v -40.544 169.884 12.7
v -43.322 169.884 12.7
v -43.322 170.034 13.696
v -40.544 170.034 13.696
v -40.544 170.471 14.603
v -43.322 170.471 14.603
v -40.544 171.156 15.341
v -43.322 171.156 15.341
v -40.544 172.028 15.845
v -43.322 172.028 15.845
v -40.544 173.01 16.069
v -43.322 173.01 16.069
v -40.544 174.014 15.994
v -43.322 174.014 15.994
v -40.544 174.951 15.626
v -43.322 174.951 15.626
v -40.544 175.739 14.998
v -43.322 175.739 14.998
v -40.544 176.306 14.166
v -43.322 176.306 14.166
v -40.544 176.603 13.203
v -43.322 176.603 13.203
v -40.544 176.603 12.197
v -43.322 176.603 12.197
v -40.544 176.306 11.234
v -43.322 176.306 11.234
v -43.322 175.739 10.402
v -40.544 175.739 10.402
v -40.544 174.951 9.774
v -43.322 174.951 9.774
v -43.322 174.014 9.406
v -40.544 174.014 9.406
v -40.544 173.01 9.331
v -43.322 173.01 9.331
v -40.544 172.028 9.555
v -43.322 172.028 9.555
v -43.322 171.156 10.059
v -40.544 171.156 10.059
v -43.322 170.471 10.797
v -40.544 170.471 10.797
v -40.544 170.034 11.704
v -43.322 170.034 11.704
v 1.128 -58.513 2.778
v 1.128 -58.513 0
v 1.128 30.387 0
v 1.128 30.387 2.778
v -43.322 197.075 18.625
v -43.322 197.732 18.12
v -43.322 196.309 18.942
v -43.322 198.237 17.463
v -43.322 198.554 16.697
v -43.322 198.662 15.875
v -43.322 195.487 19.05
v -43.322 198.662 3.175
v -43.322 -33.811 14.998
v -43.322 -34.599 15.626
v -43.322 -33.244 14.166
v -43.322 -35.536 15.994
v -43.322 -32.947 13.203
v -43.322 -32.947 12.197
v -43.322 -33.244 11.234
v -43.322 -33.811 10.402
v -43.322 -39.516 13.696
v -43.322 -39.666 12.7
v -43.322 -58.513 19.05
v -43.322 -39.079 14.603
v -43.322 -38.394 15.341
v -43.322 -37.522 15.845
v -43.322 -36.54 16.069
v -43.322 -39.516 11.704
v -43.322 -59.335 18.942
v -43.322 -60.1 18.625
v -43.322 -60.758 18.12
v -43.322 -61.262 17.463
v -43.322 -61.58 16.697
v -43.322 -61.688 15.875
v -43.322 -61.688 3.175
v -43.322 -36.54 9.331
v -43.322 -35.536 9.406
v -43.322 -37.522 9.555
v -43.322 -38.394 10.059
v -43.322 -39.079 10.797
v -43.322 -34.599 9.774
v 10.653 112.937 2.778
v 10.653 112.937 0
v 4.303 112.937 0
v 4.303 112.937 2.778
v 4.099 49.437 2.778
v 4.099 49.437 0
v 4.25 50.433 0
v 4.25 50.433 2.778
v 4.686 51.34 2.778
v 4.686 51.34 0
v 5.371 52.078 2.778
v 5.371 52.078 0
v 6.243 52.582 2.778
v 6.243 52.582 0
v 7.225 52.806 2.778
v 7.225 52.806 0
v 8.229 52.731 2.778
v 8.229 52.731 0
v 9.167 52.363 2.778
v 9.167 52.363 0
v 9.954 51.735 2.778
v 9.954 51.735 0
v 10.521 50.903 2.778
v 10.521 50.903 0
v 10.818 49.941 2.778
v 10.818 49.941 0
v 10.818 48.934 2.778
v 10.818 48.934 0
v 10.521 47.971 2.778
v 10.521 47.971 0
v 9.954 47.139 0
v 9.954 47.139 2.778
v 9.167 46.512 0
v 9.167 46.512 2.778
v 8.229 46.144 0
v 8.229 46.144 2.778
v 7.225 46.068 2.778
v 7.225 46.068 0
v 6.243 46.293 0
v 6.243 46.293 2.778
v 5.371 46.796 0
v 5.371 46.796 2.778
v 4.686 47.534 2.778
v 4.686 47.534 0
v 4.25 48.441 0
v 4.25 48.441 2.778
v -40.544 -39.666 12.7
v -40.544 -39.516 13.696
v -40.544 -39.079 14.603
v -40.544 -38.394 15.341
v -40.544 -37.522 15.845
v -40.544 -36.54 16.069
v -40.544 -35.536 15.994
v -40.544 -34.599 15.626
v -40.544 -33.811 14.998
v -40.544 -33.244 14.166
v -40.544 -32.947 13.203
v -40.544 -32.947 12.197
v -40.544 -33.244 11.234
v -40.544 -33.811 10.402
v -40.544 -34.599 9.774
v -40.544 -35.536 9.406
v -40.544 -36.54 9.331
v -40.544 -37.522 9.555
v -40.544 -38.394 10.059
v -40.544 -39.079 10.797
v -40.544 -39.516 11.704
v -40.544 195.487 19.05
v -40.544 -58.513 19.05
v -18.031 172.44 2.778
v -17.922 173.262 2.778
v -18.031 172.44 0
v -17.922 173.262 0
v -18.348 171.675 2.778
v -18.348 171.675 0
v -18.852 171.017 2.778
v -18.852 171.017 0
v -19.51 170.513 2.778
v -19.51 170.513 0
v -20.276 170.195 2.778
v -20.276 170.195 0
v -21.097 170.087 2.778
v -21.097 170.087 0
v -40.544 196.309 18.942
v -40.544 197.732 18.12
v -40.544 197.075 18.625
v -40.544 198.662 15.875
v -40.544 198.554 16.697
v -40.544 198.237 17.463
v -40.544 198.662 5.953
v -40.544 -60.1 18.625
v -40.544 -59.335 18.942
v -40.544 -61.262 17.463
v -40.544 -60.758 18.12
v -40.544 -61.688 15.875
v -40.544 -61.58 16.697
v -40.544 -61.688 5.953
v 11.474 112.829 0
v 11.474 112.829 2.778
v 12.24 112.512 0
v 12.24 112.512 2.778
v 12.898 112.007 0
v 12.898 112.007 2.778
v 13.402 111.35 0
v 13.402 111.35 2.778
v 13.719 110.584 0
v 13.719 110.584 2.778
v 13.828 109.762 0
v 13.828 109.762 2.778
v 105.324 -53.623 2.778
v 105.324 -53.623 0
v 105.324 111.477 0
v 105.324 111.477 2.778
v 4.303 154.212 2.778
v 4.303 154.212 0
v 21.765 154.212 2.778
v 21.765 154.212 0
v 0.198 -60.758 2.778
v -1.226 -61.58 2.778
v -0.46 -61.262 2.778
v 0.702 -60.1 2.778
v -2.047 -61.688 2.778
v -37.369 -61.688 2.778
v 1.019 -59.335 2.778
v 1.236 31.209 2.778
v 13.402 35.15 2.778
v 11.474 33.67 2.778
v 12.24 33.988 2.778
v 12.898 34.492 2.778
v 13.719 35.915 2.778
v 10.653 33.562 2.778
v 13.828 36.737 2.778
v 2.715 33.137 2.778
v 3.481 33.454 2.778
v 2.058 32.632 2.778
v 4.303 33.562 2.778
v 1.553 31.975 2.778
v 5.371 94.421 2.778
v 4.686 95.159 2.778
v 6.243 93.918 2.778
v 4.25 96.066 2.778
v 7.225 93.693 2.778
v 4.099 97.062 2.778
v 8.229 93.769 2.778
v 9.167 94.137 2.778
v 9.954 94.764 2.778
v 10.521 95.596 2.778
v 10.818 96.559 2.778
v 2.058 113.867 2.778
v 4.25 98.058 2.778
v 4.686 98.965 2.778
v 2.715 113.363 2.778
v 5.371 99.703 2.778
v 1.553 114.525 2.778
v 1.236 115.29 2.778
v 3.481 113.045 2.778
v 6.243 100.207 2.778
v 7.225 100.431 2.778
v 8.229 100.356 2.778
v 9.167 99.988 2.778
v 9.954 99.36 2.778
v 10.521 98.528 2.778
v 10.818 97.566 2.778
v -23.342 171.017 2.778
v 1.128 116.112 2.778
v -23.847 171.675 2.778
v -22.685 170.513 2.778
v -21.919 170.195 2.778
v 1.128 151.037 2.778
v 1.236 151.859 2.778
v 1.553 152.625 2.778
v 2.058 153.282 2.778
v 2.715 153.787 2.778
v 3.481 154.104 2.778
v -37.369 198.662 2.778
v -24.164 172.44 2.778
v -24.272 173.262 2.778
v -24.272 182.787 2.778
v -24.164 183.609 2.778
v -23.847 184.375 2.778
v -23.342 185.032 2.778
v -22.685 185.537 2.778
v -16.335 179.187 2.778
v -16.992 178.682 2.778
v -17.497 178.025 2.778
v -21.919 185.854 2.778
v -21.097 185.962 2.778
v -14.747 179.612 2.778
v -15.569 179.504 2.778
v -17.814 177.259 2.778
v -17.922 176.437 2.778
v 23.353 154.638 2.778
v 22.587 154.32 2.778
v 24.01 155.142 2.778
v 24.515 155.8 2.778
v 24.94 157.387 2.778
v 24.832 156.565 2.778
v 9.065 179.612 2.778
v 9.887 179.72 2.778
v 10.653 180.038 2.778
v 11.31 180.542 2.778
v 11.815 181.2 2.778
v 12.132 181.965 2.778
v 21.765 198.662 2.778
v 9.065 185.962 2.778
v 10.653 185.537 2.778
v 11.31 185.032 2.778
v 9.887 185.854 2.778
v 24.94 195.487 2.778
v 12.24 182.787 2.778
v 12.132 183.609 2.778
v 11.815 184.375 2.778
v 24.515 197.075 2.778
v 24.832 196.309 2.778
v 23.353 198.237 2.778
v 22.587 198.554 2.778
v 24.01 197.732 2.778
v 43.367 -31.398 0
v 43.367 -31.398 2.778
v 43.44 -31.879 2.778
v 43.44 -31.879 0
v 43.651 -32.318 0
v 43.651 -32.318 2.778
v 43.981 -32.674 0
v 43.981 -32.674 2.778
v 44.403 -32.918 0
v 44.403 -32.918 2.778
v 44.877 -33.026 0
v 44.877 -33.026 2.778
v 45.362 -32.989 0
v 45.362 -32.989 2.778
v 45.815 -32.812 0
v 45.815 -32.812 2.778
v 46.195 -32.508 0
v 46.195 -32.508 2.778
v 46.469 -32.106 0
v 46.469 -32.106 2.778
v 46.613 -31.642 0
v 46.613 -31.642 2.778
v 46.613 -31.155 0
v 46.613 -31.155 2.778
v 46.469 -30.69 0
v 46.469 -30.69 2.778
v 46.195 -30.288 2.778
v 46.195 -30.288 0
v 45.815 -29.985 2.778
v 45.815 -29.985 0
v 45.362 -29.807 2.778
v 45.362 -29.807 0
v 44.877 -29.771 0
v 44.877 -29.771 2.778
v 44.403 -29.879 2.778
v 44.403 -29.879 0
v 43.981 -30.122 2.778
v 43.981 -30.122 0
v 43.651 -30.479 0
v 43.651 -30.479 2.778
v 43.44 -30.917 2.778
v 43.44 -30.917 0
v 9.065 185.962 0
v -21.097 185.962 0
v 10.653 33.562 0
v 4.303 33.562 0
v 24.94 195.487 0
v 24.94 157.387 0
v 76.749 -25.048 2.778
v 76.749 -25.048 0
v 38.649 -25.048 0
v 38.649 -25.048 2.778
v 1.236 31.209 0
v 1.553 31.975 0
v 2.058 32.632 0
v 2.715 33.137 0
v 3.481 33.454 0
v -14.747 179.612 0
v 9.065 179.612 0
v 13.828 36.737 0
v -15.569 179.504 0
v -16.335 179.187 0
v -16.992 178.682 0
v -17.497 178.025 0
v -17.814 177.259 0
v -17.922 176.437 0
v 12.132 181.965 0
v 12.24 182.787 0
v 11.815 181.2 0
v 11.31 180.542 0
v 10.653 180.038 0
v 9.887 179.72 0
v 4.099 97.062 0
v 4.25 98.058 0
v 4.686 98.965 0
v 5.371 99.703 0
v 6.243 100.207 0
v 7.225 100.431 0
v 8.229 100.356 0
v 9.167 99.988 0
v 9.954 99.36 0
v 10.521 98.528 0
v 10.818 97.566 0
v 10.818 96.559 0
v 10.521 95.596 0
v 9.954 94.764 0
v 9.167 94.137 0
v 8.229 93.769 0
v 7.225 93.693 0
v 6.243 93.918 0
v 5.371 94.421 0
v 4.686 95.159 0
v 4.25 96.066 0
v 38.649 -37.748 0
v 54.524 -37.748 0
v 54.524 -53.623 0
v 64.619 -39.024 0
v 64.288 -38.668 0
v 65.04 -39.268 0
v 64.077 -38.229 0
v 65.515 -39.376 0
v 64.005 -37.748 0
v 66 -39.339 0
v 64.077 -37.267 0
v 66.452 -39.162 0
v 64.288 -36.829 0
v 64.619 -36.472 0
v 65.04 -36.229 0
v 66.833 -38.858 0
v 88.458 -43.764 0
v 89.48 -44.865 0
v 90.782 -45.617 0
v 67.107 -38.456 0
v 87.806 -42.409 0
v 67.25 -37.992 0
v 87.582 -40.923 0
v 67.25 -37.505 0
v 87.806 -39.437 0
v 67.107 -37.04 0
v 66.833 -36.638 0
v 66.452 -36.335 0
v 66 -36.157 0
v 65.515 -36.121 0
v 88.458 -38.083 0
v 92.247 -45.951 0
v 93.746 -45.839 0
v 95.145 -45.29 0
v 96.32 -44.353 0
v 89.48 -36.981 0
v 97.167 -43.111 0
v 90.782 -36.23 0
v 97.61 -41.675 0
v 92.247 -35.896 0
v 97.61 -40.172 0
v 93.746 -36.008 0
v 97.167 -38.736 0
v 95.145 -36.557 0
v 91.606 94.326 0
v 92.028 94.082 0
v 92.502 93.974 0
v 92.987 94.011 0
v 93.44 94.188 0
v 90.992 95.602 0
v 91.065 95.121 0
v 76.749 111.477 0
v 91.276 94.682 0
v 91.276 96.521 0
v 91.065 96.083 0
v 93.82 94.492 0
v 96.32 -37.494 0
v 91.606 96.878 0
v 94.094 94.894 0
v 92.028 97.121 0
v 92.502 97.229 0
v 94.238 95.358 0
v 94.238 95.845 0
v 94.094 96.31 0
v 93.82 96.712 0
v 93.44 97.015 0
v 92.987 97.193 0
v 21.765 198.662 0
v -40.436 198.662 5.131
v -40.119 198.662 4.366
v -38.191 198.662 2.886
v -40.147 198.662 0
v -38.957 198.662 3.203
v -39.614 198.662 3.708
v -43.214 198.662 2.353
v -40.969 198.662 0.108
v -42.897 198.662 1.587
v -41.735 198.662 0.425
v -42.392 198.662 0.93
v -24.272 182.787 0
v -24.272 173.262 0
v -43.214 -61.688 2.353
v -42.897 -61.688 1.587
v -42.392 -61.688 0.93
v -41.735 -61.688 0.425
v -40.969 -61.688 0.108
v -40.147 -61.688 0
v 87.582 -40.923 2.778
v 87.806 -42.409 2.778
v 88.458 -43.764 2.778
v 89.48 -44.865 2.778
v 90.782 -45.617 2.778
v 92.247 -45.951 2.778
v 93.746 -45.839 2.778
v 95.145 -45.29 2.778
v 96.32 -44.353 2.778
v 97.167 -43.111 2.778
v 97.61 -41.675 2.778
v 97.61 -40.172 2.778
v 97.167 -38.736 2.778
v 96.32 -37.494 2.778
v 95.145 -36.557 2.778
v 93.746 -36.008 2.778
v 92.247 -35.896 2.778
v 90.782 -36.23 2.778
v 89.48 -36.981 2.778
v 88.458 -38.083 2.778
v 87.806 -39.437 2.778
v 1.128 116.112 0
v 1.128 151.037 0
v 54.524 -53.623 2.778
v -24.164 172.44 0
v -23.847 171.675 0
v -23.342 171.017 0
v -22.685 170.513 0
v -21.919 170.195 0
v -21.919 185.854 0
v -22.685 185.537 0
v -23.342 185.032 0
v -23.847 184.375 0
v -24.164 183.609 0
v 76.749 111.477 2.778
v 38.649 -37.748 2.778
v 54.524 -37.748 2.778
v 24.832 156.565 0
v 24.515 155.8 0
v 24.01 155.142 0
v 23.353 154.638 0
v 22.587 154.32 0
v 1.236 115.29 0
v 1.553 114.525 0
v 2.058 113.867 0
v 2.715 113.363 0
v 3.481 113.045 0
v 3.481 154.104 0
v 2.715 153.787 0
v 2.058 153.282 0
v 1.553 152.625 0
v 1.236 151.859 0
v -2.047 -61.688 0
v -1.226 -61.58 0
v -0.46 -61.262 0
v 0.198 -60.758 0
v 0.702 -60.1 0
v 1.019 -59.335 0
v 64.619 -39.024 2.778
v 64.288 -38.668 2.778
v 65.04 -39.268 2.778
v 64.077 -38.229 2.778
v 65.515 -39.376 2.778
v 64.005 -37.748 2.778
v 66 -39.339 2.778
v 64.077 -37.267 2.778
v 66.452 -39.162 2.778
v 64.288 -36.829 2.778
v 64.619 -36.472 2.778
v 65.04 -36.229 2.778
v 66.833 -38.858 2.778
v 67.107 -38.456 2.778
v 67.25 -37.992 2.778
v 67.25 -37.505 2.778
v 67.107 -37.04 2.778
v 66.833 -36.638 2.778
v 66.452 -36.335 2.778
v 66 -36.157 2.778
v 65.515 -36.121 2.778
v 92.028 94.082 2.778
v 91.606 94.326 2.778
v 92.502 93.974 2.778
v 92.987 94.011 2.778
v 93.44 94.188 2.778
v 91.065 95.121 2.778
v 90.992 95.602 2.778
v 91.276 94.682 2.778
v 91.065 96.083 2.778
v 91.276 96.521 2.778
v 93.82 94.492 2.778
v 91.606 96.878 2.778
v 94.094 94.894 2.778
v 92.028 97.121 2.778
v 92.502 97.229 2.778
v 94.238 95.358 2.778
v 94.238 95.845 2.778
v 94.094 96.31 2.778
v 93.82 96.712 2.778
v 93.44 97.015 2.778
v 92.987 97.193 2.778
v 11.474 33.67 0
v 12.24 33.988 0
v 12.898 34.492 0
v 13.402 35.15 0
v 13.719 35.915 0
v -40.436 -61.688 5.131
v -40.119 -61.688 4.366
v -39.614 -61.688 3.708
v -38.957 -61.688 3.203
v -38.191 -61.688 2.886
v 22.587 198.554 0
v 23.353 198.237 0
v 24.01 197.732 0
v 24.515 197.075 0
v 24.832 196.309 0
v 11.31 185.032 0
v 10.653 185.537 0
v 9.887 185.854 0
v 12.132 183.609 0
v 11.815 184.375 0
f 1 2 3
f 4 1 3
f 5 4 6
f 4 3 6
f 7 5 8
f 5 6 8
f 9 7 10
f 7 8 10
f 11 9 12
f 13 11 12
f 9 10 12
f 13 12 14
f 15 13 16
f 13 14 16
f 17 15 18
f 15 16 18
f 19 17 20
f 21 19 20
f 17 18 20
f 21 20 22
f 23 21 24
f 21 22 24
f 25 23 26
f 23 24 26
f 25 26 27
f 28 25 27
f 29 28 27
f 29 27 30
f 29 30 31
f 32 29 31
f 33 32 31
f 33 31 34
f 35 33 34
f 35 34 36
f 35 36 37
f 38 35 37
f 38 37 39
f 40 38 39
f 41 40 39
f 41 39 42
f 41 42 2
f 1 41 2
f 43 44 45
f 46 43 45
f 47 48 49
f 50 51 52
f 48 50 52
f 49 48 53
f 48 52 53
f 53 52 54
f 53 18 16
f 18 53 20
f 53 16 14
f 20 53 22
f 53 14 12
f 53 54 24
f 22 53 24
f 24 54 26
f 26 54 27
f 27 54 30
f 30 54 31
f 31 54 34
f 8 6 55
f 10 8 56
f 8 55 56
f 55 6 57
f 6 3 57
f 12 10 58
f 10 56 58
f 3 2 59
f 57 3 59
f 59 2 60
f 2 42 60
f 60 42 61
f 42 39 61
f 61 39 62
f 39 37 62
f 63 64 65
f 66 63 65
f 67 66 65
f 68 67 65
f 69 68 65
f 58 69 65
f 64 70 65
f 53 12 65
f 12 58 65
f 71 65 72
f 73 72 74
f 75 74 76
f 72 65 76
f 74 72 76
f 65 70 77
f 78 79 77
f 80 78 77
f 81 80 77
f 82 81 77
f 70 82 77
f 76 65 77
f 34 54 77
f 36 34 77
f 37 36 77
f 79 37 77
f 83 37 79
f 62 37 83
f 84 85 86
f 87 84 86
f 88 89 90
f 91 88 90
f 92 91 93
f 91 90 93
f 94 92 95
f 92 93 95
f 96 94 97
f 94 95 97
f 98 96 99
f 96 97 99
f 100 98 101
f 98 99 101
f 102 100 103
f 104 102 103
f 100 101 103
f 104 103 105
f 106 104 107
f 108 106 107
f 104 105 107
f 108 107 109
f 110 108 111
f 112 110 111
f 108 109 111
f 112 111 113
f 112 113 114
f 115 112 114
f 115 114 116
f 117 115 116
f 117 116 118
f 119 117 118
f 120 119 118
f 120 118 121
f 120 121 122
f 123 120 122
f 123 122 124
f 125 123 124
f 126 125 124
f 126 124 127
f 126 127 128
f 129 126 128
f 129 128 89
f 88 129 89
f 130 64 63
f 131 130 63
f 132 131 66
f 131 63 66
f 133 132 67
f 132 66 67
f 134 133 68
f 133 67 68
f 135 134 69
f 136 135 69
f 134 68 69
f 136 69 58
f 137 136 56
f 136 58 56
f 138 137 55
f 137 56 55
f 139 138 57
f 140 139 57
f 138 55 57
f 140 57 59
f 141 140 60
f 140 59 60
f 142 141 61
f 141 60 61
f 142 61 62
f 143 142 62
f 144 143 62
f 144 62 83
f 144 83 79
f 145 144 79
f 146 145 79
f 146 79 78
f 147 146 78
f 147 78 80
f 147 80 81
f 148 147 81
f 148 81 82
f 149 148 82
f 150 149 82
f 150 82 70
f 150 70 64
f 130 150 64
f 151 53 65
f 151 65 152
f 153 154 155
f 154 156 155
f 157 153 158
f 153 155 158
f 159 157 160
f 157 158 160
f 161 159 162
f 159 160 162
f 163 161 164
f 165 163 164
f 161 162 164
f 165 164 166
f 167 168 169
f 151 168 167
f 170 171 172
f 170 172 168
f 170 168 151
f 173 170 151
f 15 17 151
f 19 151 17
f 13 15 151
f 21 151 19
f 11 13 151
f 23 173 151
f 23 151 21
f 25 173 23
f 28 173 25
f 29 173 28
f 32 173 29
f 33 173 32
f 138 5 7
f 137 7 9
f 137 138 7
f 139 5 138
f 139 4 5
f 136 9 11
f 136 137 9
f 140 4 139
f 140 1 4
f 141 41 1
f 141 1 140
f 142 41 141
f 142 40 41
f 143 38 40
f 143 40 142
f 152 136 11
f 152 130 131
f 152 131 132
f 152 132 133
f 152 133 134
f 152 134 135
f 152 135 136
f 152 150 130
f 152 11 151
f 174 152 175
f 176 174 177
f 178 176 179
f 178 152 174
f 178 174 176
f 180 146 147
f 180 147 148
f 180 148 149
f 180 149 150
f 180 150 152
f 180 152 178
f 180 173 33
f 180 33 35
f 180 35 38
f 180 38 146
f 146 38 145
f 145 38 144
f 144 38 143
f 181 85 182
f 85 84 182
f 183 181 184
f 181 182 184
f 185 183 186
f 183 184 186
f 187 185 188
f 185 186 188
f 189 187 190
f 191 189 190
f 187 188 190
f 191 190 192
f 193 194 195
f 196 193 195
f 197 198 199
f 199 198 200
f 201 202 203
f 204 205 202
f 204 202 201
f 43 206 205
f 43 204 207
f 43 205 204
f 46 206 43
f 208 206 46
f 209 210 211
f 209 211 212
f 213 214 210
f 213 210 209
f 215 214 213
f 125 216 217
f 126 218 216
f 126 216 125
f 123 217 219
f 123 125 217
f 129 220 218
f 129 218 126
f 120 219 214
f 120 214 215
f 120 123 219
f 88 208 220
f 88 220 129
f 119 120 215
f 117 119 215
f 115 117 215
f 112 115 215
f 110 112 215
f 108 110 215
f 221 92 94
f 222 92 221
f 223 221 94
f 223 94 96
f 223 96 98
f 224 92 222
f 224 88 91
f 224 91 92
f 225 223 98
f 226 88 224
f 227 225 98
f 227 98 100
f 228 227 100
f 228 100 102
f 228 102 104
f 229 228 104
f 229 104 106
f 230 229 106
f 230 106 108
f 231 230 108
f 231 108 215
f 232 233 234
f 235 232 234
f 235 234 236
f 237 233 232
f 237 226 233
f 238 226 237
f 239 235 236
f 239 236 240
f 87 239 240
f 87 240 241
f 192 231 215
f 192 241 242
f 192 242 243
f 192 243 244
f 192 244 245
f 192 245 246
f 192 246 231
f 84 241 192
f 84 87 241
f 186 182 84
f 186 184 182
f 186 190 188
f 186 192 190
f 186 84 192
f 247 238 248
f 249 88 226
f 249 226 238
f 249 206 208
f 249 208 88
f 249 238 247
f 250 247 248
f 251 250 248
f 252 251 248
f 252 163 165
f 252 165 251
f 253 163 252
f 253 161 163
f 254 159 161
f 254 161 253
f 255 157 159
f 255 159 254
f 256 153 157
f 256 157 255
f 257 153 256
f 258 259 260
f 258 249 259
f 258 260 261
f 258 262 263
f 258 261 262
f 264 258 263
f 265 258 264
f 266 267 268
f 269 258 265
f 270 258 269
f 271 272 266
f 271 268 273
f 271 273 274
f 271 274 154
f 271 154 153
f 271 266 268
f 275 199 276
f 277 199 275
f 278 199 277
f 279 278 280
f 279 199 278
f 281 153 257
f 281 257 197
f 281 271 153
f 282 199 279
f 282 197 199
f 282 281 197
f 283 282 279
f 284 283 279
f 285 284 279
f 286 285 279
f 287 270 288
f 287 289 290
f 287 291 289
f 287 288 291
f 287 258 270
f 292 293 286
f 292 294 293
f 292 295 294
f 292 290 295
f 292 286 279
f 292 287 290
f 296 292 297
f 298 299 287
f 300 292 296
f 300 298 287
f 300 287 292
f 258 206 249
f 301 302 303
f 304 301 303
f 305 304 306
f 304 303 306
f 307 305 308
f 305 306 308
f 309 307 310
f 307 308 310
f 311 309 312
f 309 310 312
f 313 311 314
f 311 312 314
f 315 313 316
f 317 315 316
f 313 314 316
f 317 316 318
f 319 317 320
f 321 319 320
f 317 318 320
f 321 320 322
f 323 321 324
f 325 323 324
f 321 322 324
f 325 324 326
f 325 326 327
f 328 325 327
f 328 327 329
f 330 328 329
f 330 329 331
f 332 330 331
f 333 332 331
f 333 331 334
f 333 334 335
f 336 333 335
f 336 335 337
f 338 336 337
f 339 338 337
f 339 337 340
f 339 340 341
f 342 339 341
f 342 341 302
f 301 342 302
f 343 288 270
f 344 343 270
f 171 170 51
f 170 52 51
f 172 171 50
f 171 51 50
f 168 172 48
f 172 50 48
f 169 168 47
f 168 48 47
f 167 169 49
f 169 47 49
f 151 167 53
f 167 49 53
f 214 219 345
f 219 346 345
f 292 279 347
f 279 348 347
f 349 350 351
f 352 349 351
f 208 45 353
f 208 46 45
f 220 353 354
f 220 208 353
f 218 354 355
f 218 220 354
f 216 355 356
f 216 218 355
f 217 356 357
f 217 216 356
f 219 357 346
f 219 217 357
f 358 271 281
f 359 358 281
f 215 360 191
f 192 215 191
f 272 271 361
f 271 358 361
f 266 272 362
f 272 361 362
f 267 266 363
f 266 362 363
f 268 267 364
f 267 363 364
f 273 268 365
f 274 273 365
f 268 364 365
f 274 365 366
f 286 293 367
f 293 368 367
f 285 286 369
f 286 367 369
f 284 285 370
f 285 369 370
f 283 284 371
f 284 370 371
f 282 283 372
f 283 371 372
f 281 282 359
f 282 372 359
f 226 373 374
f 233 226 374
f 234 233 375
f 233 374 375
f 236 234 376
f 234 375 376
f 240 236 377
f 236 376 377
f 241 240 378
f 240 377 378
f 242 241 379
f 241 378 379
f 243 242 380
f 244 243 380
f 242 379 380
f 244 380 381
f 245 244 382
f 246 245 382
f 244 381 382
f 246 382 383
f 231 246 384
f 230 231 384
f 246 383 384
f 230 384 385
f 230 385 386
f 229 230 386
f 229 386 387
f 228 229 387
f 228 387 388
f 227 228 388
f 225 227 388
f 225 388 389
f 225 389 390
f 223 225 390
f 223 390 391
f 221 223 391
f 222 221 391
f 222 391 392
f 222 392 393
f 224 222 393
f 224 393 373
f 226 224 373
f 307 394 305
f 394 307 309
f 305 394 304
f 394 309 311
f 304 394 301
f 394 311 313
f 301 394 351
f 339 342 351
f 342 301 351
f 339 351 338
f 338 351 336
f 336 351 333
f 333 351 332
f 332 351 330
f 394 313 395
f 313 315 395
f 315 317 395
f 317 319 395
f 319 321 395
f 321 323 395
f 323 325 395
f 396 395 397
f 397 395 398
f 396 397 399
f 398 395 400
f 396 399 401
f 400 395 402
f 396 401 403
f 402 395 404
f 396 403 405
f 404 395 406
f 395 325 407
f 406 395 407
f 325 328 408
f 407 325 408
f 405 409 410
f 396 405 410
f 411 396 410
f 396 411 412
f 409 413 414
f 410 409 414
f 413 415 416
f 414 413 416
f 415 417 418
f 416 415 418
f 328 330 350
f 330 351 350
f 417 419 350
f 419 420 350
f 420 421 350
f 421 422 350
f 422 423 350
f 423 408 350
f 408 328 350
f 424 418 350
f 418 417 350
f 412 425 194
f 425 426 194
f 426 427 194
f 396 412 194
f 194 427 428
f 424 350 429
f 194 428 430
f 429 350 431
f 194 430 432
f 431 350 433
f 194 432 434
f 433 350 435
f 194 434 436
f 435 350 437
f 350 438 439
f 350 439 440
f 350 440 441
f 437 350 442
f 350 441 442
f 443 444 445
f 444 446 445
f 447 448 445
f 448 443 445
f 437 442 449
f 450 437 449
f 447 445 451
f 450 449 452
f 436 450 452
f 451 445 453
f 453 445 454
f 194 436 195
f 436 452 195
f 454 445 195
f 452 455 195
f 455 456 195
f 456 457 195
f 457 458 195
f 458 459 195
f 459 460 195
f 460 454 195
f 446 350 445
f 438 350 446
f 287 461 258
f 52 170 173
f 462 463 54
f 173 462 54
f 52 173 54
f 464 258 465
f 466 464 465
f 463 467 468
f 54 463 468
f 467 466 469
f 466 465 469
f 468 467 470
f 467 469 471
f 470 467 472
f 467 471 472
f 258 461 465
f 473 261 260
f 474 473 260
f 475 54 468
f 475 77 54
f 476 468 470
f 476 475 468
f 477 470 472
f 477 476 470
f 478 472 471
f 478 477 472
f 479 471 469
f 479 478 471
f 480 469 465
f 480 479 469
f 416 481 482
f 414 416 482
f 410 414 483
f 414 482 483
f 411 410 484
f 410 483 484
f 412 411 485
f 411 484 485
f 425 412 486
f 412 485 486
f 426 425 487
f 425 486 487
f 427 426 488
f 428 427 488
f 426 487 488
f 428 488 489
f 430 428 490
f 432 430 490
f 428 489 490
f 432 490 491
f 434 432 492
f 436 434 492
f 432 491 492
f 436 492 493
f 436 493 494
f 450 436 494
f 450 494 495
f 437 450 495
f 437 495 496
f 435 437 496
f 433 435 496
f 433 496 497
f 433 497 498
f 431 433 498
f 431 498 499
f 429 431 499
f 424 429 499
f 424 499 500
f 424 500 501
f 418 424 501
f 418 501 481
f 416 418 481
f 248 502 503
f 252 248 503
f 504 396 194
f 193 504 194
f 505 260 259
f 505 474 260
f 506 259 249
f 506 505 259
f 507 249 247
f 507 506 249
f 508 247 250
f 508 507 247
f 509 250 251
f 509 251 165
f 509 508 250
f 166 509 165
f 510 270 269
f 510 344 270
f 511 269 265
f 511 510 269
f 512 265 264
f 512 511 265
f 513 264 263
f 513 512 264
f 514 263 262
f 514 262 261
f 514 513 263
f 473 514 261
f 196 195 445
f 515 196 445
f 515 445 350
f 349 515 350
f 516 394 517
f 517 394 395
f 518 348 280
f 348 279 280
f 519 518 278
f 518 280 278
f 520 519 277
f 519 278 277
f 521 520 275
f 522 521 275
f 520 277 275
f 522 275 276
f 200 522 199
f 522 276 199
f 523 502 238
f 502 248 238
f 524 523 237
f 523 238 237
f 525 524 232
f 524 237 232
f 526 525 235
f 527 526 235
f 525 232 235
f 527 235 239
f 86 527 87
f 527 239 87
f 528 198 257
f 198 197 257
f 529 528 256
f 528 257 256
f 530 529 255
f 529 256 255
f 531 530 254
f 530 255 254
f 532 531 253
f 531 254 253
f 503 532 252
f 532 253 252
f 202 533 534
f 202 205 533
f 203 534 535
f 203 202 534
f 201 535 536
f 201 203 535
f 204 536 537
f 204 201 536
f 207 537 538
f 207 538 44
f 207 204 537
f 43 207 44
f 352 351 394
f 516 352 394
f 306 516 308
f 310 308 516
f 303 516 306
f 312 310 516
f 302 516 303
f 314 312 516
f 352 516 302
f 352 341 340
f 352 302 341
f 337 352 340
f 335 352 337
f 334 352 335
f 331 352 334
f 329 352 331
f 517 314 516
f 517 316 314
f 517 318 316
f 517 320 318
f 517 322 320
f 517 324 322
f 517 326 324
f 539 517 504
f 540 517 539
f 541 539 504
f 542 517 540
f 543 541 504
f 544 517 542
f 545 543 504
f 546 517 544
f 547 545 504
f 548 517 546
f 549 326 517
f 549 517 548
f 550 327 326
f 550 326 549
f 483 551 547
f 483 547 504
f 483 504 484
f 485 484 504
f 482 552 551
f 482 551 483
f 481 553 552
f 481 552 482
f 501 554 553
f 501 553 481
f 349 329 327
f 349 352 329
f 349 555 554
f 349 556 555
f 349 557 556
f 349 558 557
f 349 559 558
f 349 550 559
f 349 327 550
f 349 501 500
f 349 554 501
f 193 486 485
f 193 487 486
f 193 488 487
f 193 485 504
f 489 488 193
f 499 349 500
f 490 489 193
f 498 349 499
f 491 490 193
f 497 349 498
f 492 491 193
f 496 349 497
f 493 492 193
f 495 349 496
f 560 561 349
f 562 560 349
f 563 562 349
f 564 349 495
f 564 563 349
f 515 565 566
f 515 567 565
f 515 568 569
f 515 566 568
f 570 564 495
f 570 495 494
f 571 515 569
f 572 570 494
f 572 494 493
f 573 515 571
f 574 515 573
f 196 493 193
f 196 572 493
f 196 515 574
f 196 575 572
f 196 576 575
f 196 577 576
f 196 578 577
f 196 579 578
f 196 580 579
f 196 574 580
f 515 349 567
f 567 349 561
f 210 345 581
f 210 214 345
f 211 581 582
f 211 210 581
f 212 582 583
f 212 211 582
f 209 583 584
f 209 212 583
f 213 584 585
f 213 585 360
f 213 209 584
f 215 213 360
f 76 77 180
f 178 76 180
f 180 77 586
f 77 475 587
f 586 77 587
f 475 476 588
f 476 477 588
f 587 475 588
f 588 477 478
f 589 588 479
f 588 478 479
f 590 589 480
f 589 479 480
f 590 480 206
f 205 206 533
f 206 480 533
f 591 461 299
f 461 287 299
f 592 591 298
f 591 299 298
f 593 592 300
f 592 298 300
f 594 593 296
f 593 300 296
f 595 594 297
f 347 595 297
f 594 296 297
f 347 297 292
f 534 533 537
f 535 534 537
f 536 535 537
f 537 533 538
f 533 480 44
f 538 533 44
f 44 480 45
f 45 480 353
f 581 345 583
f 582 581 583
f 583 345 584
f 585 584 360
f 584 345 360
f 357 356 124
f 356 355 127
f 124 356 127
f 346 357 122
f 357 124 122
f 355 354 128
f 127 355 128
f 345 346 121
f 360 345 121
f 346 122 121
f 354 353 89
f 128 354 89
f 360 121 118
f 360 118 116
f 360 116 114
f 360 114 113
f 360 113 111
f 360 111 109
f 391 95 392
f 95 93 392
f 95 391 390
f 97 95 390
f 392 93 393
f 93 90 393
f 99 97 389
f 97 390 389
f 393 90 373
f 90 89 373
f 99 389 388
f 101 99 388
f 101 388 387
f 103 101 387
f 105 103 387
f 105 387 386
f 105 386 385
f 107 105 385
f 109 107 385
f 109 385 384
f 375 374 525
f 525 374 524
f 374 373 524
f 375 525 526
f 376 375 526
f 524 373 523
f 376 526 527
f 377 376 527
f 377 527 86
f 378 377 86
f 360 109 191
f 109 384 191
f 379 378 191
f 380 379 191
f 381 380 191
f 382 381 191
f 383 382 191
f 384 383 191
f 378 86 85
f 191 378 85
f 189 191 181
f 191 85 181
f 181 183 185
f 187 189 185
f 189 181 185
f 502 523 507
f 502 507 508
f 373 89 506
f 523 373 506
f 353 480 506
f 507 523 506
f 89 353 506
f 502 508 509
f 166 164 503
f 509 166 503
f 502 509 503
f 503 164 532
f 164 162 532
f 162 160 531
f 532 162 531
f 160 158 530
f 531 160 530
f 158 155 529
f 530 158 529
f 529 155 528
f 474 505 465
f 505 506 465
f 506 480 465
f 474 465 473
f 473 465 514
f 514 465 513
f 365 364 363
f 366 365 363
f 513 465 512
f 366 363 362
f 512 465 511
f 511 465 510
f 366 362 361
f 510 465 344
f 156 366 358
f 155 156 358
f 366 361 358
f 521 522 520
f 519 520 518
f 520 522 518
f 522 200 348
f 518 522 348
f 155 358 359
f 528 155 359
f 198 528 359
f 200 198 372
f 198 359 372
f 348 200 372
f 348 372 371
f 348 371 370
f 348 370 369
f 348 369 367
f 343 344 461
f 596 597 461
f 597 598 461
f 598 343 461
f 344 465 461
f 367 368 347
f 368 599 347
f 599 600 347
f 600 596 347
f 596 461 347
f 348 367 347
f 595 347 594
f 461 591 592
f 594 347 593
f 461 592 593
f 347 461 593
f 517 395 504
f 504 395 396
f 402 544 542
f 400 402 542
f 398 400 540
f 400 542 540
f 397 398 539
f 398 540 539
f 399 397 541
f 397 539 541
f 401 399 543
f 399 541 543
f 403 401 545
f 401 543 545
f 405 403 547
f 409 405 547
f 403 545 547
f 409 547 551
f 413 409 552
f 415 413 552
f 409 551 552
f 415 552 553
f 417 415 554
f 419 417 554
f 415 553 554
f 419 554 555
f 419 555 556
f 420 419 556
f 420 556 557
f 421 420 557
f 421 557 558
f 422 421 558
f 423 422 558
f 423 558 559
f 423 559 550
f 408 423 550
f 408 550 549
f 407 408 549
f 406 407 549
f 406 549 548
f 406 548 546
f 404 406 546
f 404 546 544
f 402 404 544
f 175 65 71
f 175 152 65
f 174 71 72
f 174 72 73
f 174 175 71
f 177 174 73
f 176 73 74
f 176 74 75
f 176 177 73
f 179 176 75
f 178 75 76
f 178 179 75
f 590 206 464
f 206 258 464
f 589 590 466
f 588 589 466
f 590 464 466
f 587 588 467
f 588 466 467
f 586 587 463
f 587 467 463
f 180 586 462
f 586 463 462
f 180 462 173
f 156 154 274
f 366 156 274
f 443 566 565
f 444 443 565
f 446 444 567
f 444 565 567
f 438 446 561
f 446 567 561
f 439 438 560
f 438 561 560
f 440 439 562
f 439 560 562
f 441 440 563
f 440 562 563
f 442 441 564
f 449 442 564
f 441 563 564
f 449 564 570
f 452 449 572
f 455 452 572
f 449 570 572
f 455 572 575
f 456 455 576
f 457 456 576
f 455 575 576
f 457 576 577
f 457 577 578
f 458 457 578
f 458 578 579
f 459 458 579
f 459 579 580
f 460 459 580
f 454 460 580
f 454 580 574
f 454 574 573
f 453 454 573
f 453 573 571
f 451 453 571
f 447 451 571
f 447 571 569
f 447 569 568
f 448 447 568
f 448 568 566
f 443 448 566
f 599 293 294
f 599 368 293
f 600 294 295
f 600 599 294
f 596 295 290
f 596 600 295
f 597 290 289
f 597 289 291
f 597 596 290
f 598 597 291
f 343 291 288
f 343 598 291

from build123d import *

# Parameters (mm, degrees)
F1_DEPTH  = 19.05
F2_DEPTH  = 2.778125
F3_T      = -2.778125
F5_DEPTH  = 25.4
F7_D      = 6.7564
F7_DEPTH  = 12.7
F7_TIP    = 2.0298273432
F9_D      = 3.2639
F9_DEPTH  = 12.7
F9_TIP    = 0.9805744872
F12_D     = 6.7564
F12_DEPTH = 12.7
F12_TIP   = 2.0298273432
F13_R     = 3.17499
F14_D     = 10.0838
F14_DEPTH = 12.7
F14_TIP   = 3.0294791551


# Not quite as in the source:
# - a fillet or chamfer is up to 0.001 mm smaller than in the source, because OpenCascade refuses the exact size
# - a feature names something its author has since deleted; it is built from what else it names


with BuildPart() as f1:
    # F0 (on Top) → F1 (new body)
    with BuildSketch(Plane.XY):
        Polygon((24.9401164524, 198.6622305675), (-43.3223835476, 198.6622305675), (-43.3223835476, -61.6877694325), (1.1276164524, -61.6877694325), (1.1276164524, 33.5622305675), (13.8276164524, 33.5622305675), (13.8276164524, 112.9372305675), (1.1276164524, 112.9372305675), (1.1276164524, 154.2122305675), (24.9401164524, 154.2122305675), align=None)
    extrude(amount=F1_DEPTH)

    # F3
    f3_openings = [f1.faces().sort_by_distance(p)[0] for p in [
        (-16.336644, 77.216721, 19.05),
        (13.827616, 73.249731, 9.525),
        (24.940116, 176.437231, 9.525),
        (-21.097384, -61.687769, 9.525),
        (1.127616, -14.062769, 9.525),
        (7.477616, 33.562231, 9.525),
        (7.477616, 112.937231, 9.525),
        (1.127616, 133.574731, 9.525),
        (13.033866, 154.212231, 9.525),
        (-9.191134, 198.662231, 9.525),
    ]]
    offset(amount=F3_T, openings=f3_openings)

    # F4 (on face) → F5 (cut)
    with BuildSketch(Plane.XY.offset(2.778125)):
        Polygon((12.2401164524, 179.6122305675), (12.2401164524, 185.9622305675), (-24.2723835476, 185.9622305675), (-24.2723835476, 170.0872305675), (-17.9223835476, 170.0872305675), (-17.9223835476, 179.6122305675), align=None)
    extrude(amount=-F5_DEPTH, mode=Mode.SUBTRACT)

    # F7
    with Locations(Plane.XY.offset(2.778125)):
        with Locations((7.4776164524, 97.0622305675), (7.4776164524, 49.4372305675)):
            Hole(F7_D / 2, depth=F7_DEPTH)
            with Locations((0, 0, -(F7_DEPTH + F7_TIP / 2))):  # 118° drill point
                Cone(0, F7_D / 2, F7_TIP, mode=Mode.SUBTRACT)

    # F12
    with Locations(Plane.YZ.offset(-40.5442585476)):
        with Locations((-36.2877694325, 12.7), (173.2622305675, 12.7)):
            Hole(F12_D / 2, depth=F12_DEPTH)
            with Locations((0, 0, -(F12_DEPTH + F12_TIP / 2))):  # 118° drill point
                Cone(0, F12_D / 2, F12_TIP, mode=Mode.SUBTRACT)

    # F13 (radius 3.175 in the source; OpenCascade refuses exactly that, so slightly less here)
    f13_edges = [f1.edges().sort_by_distance(p)[0] for p in [
        (-24.272384, 170.087231, 1.389063),
        (-24.272384, 185.962231, 1.389063),
        (-17.922384, 170.087231, 1.389063),
        (-17.922384, 179.612231, 1.389063),
        (12.240116, 185.962231, 1.389063),
        (12.240116, 179.612231, 1.389063),
        (24.940116, 198.662231, 1.389063),
        (1.127616, 112.937231, 1.389063),
        (1.127616, 154.212231, 1.389063),
        (24.940116, 154.212231, 1.389063),
        (13.827616, 112.937231, 1.389063),
        (13.827616, 33.562231, 1.389063),
        (1.127616, 33.562231, 1.389063),
        (1.127616, -61.687769, 1.389063),
        (-40.544259, 68.487231, 2.778125),
        (-41.933321, -61.687769, 19.05),
        (-41.933321, 198.662231, 19.05),
        (-43.322384, 68.487231, 0),
    ]]
    fillet(f13_edges, radius=F13_R)


with BuildPart() as f2:
    # F0 (on Top) → F2 (new body)
    with BuildSketch(Plane.XY):
        Polygon((105.3239927769, -53.6233703196), (105.3239927769, 111.4766296804), (76.7489927769, 111.4766296804), (76.7489927769, -25.0483703196), (38.6489927769, -25.0483703196), (38.6489927769, -37.7483703196), (54.5239927769, -37.7483703196), (54.5239927769, -53.6233703196), align=None)
    extrude(amount=F2_DEPTH)

    # F9
    with Locations(Plane(origin=(0, 0, 0), x_dir=(1, 0, 0), z_dir=(0, 0, -1))):
        with Locations((65.6364927769, 37.7483703196), (44.9989927769, 31.3983703196), (92.6239927769, -95.6016296804)):
            Hole(F9_D / 2, depth=F9_DEPTH)
            with Locations((0, 0, -(F9_DEPTH + F9_TIP / 2))):  # 118° drill point
                Cone(0, F9_D / 2, F9_TIP, mode=Mode.SUBTRACT)

    # F14
    with Locations(Plane(origin=(0, 0, 0), x_dir=(1, 0, 0), z_dir=(0, 0, -1))):
        with Locations((92.6239927769, 40.9233703196)):
            Hole(F14_D / 2, depth=F14_DEPTH)
            with Locations((0, 0, -(F14_DEPTH + F14_TIP / 2))):  # 118° drill point
                Cone(0, F14_D / 2, F14_TIP, mode=Mode.SUBTRACT)


solid = Compound([f1.part, f2.part])
